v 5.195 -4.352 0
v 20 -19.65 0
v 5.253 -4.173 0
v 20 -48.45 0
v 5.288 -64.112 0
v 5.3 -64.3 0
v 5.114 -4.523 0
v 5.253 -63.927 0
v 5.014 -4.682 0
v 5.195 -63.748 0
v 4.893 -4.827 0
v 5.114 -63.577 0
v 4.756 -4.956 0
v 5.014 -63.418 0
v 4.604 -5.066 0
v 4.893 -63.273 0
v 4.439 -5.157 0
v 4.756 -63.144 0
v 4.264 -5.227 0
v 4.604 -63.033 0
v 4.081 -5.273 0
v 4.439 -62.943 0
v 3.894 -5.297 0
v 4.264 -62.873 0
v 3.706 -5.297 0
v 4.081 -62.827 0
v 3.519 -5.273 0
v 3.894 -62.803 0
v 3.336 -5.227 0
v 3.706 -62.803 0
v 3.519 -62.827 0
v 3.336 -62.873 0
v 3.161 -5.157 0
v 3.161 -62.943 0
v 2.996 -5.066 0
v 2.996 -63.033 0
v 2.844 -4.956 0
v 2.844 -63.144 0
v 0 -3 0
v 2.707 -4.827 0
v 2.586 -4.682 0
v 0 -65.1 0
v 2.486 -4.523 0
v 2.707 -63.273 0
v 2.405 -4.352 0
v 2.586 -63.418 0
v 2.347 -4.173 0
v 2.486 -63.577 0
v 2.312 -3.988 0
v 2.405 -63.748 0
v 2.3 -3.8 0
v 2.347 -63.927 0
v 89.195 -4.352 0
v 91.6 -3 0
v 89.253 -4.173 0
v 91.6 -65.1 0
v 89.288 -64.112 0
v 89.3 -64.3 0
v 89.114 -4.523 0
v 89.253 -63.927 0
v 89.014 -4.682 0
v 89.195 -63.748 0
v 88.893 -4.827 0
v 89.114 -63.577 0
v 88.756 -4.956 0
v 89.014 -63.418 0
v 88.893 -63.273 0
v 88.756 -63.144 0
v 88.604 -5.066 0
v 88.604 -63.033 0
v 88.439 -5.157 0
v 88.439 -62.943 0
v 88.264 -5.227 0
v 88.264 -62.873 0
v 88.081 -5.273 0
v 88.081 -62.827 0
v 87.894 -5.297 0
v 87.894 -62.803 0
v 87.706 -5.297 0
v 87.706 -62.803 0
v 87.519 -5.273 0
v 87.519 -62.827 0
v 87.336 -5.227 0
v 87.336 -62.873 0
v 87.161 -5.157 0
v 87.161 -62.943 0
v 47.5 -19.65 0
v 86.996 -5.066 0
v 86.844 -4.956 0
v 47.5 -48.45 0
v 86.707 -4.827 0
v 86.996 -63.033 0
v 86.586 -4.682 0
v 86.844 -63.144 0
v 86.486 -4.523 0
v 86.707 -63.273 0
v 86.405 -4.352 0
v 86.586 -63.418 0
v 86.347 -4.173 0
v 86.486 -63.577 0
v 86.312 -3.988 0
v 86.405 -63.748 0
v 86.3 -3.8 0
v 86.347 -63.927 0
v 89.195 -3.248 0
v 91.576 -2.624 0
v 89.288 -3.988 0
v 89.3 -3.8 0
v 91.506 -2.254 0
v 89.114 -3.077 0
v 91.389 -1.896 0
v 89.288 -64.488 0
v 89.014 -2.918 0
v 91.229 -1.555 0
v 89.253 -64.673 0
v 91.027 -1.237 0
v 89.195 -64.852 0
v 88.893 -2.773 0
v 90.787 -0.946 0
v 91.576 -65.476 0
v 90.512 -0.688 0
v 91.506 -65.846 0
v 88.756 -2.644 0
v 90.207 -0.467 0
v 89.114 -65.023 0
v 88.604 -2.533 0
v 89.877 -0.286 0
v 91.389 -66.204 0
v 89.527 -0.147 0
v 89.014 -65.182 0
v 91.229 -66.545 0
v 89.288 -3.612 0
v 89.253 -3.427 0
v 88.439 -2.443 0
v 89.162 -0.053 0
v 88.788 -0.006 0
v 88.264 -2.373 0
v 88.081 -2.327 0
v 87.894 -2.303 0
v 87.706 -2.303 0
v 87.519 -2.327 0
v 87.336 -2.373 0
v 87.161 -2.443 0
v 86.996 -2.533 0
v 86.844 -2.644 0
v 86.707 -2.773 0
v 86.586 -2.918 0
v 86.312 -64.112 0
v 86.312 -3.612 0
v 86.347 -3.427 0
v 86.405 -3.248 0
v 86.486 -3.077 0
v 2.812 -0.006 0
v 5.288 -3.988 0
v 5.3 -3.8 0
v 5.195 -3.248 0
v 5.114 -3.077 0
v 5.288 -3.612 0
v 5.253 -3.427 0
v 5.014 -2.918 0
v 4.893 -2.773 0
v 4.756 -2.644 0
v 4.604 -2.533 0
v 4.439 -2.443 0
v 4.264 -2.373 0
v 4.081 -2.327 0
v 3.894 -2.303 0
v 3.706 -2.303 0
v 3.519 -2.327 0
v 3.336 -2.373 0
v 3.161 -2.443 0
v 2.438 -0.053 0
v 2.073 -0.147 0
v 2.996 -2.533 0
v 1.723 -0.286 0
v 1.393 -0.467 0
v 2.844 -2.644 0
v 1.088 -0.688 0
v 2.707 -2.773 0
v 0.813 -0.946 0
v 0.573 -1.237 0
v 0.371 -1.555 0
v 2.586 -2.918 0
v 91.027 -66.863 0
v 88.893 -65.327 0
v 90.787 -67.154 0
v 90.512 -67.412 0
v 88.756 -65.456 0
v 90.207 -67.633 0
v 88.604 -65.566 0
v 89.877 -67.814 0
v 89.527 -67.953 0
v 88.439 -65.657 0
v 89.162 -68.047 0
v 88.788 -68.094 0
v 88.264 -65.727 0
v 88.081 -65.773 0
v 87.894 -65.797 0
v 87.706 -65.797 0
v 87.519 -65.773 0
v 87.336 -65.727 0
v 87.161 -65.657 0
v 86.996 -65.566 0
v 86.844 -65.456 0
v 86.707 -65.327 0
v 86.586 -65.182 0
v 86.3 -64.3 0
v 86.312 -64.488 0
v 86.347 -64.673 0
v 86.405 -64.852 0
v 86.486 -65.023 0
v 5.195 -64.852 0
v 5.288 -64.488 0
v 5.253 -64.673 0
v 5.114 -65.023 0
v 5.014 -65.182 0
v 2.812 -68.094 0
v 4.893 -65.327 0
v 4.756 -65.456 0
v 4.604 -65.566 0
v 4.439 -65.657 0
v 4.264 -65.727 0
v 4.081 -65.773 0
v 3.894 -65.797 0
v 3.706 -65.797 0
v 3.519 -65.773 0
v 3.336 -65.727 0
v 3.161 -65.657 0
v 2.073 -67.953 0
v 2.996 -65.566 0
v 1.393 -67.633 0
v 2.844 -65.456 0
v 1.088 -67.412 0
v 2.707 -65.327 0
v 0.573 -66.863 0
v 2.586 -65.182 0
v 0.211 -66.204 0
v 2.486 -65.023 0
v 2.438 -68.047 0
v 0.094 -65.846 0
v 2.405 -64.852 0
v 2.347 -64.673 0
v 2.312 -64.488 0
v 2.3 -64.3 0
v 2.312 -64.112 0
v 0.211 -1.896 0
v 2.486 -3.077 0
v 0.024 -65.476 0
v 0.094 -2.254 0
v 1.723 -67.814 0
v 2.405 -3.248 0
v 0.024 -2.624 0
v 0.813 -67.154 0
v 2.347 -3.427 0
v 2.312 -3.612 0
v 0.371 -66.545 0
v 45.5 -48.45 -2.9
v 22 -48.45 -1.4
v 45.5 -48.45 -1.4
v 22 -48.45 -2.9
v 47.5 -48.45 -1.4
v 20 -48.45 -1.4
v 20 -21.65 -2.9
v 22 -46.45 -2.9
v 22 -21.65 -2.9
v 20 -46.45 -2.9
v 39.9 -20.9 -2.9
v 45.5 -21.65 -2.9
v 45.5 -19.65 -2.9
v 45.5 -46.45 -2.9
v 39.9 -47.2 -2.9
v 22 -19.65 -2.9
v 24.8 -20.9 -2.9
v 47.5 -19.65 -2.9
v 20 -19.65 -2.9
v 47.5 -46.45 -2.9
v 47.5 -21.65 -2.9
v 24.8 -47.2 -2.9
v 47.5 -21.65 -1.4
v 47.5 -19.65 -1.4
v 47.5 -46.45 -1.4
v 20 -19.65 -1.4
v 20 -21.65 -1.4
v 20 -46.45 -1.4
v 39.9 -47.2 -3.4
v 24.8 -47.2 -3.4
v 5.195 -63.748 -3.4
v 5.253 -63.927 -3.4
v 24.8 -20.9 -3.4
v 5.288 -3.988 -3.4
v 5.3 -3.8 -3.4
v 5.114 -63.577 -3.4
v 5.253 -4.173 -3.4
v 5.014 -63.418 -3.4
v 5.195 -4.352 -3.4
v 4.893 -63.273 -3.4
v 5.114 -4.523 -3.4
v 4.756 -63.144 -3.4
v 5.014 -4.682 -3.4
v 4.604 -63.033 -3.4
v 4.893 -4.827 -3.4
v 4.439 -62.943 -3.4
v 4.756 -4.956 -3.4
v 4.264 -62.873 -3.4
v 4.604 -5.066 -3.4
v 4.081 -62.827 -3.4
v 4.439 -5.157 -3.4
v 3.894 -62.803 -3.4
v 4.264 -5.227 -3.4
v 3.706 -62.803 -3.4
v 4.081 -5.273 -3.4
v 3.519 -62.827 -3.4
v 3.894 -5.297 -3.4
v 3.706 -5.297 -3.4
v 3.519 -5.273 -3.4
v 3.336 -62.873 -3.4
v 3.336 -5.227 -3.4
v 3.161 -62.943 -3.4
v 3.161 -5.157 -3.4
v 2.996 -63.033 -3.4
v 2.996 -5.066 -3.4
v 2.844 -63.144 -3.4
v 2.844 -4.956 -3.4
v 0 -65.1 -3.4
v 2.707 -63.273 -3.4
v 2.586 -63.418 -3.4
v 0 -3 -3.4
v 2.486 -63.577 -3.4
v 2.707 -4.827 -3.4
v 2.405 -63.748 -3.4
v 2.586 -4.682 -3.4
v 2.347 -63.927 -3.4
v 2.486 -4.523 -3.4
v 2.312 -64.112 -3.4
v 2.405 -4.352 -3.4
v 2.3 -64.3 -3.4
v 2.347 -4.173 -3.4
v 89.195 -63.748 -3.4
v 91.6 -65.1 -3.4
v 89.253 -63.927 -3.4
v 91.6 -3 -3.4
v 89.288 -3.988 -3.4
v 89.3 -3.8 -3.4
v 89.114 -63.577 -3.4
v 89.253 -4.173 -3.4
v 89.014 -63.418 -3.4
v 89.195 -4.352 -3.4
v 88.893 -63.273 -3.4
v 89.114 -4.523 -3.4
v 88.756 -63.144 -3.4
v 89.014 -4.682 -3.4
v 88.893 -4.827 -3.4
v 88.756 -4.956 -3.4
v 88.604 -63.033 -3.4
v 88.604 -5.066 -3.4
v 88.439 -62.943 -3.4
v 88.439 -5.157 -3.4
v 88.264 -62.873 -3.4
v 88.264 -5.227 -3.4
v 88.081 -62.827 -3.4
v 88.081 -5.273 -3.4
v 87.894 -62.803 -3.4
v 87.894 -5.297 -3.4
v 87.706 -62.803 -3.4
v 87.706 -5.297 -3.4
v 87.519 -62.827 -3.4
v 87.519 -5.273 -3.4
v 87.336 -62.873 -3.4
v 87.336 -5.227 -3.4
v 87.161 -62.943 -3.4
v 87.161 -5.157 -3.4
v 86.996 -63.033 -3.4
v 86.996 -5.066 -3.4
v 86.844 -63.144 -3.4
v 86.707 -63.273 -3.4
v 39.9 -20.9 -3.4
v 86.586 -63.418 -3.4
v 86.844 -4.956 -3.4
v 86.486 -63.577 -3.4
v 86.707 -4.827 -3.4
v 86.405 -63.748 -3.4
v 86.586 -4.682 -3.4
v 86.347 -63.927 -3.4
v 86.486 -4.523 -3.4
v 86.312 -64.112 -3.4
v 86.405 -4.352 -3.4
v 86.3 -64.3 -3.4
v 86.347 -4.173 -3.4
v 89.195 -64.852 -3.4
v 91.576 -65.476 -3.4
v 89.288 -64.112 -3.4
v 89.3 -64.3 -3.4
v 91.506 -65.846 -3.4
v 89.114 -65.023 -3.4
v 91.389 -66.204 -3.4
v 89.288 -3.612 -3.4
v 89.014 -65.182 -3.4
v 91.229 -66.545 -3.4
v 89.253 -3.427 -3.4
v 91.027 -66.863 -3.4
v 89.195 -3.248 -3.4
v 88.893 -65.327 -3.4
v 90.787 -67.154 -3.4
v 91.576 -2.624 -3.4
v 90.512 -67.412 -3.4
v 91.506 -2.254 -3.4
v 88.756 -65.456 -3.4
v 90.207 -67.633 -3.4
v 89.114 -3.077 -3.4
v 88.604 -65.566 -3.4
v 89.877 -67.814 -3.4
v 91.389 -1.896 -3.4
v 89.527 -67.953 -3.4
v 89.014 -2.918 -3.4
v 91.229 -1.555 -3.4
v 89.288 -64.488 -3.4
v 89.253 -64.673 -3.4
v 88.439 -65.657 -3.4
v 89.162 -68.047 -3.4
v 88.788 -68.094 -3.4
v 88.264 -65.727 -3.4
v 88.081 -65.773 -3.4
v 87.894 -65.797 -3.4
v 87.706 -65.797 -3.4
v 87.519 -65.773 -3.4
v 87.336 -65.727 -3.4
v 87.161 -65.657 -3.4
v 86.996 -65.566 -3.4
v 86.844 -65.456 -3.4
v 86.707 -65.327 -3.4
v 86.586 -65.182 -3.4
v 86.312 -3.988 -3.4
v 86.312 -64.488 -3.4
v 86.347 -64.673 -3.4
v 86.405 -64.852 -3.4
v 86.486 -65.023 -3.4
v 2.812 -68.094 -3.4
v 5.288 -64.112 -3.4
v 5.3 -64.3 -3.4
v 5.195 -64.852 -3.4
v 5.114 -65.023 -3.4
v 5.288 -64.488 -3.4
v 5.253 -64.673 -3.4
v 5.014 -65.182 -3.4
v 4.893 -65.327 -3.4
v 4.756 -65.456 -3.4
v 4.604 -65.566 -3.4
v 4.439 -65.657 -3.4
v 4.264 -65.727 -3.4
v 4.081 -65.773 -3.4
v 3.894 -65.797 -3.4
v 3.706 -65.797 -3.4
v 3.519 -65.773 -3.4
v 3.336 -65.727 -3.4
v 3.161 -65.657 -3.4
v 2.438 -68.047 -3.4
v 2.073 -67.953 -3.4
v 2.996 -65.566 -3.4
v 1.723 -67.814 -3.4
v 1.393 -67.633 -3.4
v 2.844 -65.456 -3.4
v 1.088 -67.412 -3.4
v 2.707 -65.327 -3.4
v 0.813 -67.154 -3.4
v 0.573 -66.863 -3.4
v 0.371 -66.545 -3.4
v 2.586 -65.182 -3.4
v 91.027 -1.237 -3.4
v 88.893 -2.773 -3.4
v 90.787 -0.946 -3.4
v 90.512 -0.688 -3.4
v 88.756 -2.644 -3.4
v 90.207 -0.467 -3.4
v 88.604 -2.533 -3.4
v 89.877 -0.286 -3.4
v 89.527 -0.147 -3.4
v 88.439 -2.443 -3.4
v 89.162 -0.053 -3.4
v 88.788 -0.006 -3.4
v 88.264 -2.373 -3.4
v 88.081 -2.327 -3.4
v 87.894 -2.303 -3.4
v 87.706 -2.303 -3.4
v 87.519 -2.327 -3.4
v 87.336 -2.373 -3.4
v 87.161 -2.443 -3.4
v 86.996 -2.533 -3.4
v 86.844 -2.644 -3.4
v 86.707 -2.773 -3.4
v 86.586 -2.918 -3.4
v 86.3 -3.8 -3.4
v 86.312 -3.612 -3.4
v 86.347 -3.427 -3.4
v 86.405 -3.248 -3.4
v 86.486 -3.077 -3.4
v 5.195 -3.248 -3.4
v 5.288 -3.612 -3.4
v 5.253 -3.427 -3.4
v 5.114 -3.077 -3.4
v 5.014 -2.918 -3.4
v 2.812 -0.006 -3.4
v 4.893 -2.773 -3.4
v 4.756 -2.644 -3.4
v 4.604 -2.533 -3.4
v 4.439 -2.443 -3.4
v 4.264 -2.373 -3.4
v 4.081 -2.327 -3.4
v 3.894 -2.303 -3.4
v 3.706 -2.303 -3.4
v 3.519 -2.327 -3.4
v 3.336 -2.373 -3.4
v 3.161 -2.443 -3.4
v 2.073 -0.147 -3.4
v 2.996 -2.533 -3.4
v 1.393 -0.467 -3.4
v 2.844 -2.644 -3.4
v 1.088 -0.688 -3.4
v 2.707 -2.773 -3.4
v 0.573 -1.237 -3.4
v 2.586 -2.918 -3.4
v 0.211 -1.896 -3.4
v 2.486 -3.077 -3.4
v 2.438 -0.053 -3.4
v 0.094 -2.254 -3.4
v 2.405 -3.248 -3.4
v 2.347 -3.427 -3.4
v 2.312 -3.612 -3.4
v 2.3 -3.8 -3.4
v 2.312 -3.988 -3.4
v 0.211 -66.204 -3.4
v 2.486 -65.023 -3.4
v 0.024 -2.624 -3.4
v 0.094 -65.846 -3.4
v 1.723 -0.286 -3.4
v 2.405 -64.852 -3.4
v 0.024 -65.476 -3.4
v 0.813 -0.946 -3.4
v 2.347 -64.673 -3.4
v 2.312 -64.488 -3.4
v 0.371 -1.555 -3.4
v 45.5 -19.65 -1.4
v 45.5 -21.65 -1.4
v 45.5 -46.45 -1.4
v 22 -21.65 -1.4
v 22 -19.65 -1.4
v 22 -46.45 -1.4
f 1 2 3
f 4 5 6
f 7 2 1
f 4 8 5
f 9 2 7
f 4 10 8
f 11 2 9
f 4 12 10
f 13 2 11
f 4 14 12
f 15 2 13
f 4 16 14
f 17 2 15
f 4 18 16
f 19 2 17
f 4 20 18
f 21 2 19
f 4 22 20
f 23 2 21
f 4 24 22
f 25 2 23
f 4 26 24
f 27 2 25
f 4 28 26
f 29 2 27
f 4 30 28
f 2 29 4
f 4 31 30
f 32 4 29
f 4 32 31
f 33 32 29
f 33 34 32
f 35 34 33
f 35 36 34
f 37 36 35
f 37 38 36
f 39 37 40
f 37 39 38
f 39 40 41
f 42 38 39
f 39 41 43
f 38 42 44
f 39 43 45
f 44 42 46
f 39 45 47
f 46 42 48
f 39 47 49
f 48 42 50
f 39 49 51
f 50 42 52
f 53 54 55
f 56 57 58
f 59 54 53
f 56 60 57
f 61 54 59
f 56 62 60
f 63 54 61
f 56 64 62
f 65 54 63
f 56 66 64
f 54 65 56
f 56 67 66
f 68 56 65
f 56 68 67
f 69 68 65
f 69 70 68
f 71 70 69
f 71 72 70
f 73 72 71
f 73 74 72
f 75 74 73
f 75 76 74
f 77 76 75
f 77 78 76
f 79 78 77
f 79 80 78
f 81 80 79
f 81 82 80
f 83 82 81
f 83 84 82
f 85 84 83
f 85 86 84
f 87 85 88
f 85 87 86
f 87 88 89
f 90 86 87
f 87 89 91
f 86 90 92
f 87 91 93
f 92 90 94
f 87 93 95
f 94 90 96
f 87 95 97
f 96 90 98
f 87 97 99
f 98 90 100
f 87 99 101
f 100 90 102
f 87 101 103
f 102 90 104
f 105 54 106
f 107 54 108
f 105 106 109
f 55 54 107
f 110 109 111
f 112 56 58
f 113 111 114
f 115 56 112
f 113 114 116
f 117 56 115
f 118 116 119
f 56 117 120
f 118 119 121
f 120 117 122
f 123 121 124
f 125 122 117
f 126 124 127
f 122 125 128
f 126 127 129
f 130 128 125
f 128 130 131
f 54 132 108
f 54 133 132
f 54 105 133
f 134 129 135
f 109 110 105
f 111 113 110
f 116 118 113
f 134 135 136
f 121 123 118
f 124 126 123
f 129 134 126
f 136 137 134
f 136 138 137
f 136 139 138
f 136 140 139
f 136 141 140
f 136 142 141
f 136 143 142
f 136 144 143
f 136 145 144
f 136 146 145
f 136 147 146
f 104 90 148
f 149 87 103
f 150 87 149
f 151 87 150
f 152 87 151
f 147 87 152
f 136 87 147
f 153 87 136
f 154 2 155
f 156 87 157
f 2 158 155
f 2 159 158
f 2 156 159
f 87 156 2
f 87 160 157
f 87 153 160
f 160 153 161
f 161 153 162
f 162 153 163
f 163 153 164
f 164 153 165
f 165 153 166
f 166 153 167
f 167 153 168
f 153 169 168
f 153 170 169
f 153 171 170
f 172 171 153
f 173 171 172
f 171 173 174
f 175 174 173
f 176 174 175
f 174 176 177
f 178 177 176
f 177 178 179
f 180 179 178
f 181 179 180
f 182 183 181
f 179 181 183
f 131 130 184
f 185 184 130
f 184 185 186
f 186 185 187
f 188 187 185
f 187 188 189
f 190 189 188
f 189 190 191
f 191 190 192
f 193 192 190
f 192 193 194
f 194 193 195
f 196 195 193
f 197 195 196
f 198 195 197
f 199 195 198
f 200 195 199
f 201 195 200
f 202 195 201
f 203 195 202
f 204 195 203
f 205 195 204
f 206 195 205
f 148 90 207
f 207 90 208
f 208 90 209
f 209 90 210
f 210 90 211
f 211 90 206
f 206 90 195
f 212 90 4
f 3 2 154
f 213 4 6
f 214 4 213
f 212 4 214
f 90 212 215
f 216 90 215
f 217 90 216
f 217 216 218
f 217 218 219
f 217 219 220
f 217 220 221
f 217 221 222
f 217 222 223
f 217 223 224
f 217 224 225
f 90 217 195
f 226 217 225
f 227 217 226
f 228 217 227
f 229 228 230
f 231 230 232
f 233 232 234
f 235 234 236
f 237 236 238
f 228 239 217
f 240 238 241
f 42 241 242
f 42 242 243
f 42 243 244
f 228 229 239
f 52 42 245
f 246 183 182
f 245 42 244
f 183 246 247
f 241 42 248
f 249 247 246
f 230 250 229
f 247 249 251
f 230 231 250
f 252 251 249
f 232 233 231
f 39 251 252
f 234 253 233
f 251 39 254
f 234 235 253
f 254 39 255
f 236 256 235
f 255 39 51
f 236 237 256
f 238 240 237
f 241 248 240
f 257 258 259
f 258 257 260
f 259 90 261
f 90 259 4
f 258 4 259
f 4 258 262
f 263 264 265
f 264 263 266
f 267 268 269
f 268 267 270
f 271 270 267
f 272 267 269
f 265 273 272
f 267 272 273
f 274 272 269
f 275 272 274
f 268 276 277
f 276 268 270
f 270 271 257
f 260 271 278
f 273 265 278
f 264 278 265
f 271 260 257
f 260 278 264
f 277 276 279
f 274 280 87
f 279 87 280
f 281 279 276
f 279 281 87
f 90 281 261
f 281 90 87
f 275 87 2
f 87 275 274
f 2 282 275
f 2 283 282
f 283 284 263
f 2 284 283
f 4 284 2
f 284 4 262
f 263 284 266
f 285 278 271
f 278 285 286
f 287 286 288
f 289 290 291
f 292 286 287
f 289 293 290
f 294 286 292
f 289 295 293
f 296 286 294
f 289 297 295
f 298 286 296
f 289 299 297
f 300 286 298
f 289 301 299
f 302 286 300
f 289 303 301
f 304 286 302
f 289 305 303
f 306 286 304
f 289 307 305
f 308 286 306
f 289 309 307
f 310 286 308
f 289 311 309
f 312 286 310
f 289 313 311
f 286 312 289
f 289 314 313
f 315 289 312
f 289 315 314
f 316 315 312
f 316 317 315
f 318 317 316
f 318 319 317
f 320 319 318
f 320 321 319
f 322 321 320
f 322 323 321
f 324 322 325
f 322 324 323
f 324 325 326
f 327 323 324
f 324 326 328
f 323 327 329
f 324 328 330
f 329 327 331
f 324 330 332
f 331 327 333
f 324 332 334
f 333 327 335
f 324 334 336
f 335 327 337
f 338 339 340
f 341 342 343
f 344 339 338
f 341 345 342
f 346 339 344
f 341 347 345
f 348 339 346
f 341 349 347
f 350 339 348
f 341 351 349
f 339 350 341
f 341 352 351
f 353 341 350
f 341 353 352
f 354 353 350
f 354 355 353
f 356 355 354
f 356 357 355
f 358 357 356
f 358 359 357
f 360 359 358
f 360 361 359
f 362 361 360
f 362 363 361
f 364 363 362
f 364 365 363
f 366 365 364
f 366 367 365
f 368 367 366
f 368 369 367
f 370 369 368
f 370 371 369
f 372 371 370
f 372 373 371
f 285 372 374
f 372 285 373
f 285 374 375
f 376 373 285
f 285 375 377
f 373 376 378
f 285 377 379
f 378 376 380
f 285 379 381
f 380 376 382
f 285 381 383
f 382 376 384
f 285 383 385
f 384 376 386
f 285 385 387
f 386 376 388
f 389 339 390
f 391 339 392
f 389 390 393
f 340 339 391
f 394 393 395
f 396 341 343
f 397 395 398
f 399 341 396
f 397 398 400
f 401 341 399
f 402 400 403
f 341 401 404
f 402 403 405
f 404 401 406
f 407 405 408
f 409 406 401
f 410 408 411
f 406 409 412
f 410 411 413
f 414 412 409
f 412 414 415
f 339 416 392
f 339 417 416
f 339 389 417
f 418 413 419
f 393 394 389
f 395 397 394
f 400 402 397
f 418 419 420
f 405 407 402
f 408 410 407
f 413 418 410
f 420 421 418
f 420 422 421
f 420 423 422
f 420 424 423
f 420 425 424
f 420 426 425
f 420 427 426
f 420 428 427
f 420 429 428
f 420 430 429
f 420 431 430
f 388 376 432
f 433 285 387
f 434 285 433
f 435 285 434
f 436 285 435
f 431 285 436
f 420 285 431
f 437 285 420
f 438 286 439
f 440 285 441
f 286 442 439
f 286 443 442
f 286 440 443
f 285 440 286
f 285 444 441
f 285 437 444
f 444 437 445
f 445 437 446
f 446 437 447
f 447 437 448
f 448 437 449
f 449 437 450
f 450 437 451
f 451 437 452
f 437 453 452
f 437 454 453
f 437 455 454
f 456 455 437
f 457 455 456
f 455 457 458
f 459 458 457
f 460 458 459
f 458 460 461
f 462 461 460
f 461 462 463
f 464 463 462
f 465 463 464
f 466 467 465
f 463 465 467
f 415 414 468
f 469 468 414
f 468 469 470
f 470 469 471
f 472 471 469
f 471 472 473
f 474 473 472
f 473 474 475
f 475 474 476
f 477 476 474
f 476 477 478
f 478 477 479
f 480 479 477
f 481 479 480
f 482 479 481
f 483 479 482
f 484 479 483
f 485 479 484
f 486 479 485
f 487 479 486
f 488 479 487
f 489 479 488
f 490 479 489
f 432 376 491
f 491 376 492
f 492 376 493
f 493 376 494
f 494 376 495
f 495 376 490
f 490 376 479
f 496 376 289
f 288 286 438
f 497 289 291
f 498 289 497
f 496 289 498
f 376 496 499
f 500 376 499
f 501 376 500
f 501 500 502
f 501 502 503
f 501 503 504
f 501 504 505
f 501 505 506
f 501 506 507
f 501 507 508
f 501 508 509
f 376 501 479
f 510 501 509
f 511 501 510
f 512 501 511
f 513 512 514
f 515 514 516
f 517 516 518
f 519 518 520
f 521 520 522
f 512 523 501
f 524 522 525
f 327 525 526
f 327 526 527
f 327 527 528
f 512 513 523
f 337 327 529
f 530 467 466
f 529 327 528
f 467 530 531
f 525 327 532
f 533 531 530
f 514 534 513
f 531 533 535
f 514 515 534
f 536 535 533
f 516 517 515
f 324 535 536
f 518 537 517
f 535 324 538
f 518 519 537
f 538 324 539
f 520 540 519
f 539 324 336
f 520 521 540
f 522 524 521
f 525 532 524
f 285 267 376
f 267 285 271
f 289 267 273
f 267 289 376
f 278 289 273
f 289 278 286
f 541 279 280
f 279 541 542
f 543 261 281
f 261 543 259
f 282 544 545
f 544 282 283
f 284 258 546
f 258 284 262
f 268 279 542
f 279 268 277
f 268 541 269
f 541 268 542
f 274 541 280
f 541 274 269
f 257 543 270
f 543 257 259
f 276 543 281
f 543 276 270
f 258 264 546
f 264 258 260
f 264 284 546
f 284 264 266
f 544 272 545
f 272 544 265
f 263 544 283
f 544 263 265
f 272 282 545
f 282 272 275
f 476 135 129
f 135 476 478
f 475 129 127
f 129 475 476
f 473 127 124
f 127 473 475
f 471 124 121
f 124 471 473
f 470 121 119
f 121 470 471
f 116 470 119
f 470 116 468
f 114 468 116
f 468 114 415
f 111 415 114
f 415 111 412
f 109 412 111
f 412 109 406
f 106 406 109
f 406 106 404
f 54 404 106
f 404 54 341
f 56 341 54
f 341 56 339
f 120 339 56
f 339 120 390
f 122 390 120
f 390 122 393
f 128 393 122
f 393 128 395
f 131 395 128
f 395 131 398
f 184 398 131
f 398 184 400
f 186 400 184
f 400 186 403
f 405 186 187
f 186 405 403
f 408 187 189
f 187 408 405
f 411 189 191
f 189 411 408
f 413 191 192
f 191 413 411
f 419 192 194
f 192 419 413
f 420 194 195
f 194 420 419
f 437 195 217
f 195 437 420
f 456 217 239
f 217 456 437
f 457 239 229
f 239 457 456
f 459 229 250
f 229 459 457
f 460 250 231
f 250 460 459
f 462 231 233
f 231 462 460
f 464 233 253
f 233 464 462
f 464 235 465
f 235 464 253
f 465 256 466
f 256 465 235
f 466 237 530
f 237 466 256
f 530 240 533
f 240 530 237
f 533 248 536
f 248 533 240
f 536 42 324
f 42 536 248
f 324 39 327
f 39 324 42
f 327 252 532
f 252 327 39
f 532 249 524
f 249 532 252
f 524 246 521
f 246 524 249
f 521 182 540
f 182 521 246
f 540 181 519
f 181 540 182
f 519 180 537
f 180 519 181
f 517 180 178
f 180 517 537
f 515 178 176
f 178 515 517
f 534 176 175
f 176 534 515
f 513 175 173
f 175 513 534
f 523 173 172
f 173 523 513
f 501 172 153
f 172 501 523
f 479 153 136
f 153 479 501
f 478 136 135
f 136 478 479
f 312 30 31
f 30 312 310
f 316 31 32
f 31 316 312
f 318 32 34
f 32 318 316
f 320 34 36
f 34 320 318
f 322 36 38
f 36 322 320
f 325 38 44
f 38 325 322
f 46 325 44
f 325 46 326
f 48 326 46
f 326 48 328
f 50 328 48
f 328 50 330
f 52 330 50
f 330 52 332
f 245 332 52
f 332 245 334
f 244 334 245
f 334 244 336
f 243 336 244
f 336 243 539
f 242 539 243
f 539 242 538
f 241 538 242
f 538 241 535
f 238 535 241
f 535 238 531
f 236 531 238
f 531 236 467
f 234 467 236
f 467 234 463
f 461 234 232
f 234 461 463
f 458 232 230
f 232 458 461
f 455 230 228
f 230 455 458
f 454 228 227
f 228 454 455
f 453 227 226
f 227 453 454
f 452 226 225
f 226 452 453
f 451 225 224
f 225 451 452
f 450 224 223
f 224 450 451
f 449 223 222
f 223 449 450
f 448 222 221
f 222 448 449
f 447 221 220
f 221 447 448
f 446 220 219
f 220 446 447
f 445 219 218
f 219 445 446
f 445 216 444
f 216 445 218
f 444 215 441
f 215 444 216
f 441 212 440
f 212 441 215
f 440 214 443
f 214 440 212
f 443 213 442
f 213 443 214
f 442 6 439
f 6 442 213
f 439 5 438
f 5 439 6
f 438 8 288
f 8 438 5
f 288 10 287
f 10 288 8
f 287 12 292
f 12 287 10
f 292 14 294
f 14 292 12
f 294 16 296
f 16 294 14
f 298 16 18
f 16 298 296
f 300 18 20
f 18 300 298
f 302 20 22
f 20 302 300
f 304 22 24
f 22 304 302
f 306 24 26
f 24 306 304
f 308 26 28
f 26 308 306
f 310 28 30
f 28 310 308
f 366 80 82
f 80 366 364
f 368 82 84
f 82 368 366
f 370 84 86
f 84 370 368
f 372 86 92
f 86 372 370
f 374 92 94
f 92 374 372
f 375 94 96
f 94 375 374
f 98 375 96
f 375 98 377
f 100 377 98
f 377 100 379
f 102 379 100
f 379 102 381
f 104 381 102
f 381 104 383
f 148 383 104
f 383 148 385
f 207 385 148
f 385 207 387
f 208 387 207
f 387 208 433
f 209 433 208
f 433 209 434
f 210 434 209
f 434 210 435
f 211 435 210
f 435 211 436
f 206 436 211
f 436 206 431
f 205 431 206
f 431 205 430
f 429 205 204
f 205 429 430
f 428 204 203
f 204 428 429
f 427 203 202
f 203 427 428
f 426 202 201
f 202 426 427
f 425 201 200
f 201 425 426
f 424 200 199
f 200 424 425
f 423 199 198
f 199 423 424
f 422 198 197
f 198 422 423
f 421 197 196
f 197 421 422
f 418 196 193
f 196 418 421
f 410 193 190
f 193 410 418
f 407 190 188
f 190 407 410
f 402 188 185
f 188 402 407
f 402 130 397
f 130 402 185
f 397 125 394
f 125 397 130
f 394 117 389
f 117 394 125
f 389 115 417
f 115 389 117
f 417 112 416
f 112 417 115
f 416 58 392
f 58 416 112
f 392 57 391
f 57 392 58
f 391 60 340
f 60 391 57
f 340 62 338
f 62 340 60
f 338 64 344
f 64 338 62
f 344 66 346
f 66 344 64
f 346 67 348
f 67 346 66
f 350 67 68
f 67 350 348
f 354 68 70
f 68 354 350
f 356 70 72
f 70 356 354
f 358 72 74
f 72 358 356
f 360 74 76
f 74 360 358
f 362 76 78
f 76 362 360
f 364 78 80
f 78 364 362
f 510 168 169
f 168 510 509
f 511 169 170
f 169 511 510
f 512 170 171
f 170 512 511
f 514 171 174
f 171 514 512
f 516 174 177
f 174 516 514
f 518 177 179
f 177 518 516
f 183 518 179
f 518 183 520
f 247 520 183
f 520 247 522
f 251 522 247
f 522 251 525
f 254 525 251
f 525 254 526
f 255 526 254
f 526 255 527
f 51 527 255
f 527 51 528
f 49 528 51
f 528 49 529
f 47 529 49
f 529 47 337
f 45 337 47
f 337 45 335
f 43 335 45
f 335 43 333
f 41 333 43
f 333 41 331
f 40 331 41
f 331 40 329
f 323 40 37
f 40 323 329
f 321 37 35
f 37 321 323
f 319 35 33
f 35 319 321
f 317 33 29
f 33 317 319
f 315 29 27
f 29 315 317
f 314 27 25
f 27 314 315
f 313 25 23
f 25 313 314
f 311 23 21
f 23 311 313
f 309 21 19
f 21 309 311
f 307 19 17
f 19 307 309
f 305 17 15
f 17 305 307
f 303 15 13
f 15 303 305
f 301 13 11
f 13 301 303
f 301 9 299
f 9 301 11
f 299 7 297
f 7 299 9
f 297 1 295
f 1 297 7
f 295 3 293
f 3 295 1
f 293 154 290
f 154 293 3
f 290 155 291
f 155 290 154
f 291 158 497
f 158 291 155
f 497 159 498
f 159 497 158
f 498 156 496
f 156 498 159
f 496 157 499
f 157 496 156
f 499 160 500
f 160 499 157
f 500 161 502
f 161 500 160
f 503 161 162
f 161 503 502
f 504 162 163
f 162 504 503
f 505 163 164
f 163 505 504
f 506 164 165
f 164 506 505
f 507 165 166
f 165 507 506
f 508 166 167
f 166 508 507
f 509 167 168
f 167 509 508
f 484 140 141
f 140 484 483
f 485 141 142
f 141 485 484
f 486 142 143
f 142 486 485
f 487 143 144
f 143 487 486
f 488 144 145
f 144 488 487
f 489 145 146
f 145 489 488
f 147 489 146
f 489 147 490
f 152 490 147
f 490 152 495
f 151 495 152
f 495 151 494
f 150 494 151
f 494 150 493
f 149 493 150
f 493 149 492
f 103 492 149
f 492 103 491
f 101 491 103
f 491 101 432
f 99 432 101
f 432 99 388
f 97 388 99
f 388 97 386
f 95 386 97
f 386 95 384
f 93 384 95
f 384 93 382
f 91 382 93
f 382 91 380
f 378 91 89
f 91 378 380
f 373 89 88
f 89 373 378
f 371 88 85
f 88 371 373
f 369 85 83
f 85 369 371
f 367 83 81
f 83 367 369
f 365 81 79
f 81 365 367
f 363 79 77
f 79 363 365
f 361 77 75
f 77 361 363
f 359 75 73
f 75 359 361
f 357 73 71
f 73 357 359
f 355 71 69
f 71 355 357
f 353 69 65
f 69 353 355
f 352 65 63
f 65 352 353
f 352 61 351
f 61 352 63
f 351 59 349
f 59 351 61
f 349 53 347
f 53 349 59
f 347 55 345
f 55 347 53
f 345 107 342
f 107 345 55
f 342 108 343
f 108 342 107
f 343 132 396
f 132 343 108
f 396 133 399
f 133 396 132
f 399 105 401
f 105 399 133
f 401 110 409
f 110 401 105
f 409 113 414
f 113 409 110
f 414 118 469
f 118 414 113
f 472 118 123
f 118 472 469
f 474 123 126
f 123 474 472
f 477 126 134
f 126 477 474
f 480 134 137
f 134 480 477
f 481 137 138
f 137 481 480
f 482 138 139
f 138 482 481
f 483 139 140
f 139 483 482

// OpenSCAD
$fn = 50;

LENGTH=91.6;
WIDTH=68.1;
THICKNESS=5.9;
ROUNDED=3.0;
HOLE_DISTANCE=3.8;
HOLE_RADIUS=1.5;

PCB_LENGTH=28.2+0.6;
PCB_WIDTH=27.1+0.4;
PCB_THICKNESS=3.4;
SCREEN_LENGTH=25.5+0.8;
SCREEN_WIDTH=14.3+0.8;
SCREEN_THICKNESS=1.5;
SCREEN_X=(PCB_LENGTH-SCREEN_LENGTH)/2;
SCREEN_Y=4.8;
HEADER_LENGTH=11;
HEADER_WIDTH=3;
HEADER_X=(PCB_LENGTH-HEADER_LENGTH)/2;

module screen() {
    difference() {
        union() {
            linear_extrude(PCB_THICKNESS-0.5)
                square([PCB_LENGTH,PCB_WIDTH], false);
            linear_extrude(PCB_THICKNESS)
                translate([SCREEN_X,SCREEN_Y])
                    square([SCREEN_LENGTH,SCREEN_WIDTH], false);
            translate([HEADER_X,0,-PCB_THICKNESS-1])
                linear_extrude(PCB_THICKNESS+1)
                    square([HEADER_LENGTH,HEADER_WIDTH], false);
        }
        translate([0,0,PCB_THICKNESS-SCREEN_THICKNESS-0.5])
        linear_extrude(SCREEN_THICKNESS) {
            square([2,2]);
            translate([PCB_LENGTH-2,0]) square([2,2]);
            translate([PCB_LENGTH-2,PCB_WIDTH-2]) square([2,2]);
            translate([0,PCB_WIDTH-2]) square([2,2]);
        }
    }
}

module base(thickness) {
    linear_extrude(thickness)
    difference() {
        translate([ROUNDED,ROUNDED])
        minkowski() {
            square([LENGTH-ROUNDED*2, WIDTH-ROUNDED*2], false);
            circle(ROUNDED);
        }
        translate([HOLE_DISTANCE,HOLE_DISTANCE]) circle(HOLE_RADIUS);
        translate([LENGTH-HOLE_DISTANCE,HOLE_DISTANCE]) circle(HOLE_RADIUS);
        translate([HOLE_DISTANCE,WIDTH-HOLE_DISTANCE]) circle(HOLE_RADIUS);
        translate([LENGTH-HOLE_DISTANCE,WIDTH-HOLE_DISTANCE]) circle(HOLE_RADIUS);
    }
}

module top() {
    difference() {
        base(PCB_THICKNESS);
        translate([20,(WIDTH-PCB_LENGTH)/2]) translate([0,PCB_LENGTH]) rotate([0,0,-90]) screen();
    }
}

module bottom() {
    difference() {
        base(THICKNESS - PCB_THICKNESS);
        translate([20,(WIDTH-PCB_LENGTH)/2,PCB_THICKNESS]) 
        translate([0,PCB_LENGTH]) rotate([0,0,-90]) screen();
    }
}

rotate([180,0,0]) top();
//bottom();
